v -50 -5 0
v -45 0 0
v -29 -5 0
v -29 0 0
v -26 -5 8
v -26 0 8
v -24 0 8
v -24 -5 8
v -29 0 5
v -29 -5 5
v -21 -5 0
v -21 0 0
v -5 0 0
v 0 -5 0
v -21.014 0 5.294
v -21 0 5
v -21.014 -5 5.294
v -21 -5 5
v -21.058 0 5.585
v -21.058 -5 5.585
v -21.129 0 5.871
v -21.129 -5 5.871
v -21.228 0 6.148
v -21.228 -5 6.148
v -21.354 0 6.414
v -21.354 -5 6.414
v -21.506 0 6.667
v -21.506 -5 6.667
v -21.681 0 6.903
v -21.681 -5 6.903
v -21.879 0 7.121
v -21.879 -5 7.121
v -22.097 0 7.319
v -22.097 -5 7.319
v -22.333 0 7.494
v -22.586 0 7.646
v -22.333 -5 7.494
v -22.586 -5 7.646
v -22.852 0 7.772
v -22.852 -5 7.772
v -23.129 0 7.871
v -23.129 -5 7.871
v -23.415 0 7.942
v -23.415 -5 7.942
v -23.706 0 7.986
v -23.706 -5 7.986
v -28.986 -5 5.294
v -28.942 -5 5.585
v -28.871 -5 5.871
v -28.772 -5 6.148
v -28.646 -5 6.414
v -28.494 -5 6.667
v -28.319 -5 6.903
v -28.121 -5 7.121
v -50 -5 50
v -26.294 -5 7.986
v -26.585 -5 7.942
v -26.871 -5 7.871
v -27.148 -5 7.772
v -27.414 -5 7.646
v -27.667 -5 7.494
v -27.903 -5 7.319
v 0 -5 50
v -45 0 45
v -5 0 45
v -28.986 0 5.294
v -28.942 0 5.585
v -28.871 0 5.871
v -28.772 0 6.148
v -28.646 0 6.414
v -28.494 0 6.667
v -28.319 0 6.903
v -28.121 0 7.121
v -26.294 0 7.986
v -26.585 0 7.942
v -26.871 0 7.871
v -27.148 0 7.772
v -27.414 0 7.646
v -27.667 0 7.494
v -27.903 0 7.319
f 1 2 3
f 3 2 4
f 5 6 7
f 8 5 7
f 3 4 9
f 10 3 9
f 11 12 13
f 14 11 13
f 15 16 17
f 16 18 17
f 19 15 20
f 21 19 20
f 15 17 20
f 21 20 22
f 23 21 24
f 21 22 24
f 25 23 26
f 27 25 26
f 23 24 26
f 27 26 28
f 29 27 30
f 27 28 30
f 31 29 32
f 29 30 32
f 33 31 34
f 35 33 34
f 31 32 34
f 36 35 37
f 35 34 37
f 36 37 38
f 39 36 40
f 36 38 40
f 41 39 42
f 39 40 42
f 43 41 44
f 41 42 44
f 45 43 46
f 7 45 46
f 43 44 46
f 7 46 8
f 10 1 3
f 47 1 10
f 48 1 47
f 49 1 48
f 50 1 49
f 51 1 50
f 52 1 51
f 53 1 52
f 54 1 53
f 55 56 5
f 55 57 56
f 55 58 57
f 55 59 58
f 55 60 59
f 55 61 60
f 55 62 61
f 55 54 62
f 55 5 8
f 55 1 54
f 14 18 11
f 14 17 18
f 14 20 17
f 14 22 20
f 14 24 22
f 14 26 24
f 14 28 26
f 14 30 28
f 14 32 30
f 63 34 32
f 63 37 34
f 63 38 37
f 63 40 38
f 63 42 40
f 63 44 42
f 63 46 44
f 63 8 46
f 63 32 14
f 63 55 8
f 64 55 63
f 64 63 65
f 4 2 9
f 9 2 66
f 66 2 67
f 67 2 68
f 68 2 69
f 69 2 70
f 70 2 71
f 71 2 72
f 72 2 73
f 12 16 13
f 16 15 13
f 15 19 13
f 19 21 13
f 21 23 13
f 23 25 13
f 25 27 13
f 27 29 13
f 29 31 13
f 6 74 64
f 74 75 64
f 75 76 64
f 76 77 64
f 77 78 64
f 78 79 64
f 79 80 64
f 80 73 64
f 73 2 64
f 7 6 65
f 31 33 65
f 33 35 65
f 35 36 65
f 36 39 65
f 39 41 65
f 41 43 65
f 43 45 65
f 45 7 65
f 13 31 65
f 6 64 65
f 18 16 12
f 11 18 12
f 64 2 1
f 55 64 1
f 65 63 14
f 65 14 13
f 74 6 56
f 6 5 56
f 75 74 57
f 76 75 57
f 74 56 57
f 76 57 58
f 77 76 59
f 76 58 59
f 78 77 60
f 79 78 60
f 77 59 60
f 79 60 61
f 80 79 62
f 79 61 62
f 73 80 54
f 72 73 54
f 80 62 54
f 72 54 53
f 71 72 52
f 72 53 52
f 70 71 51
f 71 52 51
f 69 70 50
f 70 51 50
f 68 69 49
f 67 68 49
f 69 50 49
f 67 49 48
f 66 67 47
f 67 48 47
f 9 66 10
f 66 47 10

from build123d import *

# Parameters (mm, degrees)
F0_W     = 50
F0_H     = 50
F1_DEPTH = 5
F3_DEPTH = 50
F5_DEPTH = 50
F7_DEPTH = 25
F8_R     = 3


with BuildPart() as f1:
    # F0 (on Front) → F1 (new body)
    with BuildSketch(Plane.XZ):
        with Locations((-25, 25)):
            Rectangle(F0_W, F0_H)
    extrude(amount=F1_DEPTH)

    # F2 (on face) → F3 (cut)
    with BuildSketch(Plane.YZ):
        Polygon((0, 45), (0, 50), (-5, 50), align=None)
    extrude(amount=-F3_DEPTH, mode=Mode.SUBTRACT)

    # F4 (on face) → F5 (cut)
    with BuildSketch(Plane(origin=(0, 0, 0), x_dir=(1, 0, 0), z_dir=(0, 0, -1))):
        Polygon((-45, 0), (-50, 5), (-50, 0), align=None)
        Polygon((-5, 0), (0, 0), (0, 5), align=None)
    extrude(amount=-F5_DEPTH, mode=Mode.SUBTRACT)

    # F6 (on face) → F7 (cut)
    with BuildSketch(Plane(origin=(0, 0, 0), x_dir=(-1, 0, 0), z_dir=(0, 1, 0))):
        Polygon((21, 0), (25, 0), (29, 0), (29, 8), (21, 8), align=None)
    extrude(amount=-F7_DEPTH, mode=Mode.SUBTRACT)

    # F8
    f8_edges = [f1.edges().sort_by_distance(p)[0] for p in [
        (-21, -2.5, 8),
        (-29, -2.5, 8),
    ]]
    fillet(f8_edges, radius=F8_R)


solid = f1.part
